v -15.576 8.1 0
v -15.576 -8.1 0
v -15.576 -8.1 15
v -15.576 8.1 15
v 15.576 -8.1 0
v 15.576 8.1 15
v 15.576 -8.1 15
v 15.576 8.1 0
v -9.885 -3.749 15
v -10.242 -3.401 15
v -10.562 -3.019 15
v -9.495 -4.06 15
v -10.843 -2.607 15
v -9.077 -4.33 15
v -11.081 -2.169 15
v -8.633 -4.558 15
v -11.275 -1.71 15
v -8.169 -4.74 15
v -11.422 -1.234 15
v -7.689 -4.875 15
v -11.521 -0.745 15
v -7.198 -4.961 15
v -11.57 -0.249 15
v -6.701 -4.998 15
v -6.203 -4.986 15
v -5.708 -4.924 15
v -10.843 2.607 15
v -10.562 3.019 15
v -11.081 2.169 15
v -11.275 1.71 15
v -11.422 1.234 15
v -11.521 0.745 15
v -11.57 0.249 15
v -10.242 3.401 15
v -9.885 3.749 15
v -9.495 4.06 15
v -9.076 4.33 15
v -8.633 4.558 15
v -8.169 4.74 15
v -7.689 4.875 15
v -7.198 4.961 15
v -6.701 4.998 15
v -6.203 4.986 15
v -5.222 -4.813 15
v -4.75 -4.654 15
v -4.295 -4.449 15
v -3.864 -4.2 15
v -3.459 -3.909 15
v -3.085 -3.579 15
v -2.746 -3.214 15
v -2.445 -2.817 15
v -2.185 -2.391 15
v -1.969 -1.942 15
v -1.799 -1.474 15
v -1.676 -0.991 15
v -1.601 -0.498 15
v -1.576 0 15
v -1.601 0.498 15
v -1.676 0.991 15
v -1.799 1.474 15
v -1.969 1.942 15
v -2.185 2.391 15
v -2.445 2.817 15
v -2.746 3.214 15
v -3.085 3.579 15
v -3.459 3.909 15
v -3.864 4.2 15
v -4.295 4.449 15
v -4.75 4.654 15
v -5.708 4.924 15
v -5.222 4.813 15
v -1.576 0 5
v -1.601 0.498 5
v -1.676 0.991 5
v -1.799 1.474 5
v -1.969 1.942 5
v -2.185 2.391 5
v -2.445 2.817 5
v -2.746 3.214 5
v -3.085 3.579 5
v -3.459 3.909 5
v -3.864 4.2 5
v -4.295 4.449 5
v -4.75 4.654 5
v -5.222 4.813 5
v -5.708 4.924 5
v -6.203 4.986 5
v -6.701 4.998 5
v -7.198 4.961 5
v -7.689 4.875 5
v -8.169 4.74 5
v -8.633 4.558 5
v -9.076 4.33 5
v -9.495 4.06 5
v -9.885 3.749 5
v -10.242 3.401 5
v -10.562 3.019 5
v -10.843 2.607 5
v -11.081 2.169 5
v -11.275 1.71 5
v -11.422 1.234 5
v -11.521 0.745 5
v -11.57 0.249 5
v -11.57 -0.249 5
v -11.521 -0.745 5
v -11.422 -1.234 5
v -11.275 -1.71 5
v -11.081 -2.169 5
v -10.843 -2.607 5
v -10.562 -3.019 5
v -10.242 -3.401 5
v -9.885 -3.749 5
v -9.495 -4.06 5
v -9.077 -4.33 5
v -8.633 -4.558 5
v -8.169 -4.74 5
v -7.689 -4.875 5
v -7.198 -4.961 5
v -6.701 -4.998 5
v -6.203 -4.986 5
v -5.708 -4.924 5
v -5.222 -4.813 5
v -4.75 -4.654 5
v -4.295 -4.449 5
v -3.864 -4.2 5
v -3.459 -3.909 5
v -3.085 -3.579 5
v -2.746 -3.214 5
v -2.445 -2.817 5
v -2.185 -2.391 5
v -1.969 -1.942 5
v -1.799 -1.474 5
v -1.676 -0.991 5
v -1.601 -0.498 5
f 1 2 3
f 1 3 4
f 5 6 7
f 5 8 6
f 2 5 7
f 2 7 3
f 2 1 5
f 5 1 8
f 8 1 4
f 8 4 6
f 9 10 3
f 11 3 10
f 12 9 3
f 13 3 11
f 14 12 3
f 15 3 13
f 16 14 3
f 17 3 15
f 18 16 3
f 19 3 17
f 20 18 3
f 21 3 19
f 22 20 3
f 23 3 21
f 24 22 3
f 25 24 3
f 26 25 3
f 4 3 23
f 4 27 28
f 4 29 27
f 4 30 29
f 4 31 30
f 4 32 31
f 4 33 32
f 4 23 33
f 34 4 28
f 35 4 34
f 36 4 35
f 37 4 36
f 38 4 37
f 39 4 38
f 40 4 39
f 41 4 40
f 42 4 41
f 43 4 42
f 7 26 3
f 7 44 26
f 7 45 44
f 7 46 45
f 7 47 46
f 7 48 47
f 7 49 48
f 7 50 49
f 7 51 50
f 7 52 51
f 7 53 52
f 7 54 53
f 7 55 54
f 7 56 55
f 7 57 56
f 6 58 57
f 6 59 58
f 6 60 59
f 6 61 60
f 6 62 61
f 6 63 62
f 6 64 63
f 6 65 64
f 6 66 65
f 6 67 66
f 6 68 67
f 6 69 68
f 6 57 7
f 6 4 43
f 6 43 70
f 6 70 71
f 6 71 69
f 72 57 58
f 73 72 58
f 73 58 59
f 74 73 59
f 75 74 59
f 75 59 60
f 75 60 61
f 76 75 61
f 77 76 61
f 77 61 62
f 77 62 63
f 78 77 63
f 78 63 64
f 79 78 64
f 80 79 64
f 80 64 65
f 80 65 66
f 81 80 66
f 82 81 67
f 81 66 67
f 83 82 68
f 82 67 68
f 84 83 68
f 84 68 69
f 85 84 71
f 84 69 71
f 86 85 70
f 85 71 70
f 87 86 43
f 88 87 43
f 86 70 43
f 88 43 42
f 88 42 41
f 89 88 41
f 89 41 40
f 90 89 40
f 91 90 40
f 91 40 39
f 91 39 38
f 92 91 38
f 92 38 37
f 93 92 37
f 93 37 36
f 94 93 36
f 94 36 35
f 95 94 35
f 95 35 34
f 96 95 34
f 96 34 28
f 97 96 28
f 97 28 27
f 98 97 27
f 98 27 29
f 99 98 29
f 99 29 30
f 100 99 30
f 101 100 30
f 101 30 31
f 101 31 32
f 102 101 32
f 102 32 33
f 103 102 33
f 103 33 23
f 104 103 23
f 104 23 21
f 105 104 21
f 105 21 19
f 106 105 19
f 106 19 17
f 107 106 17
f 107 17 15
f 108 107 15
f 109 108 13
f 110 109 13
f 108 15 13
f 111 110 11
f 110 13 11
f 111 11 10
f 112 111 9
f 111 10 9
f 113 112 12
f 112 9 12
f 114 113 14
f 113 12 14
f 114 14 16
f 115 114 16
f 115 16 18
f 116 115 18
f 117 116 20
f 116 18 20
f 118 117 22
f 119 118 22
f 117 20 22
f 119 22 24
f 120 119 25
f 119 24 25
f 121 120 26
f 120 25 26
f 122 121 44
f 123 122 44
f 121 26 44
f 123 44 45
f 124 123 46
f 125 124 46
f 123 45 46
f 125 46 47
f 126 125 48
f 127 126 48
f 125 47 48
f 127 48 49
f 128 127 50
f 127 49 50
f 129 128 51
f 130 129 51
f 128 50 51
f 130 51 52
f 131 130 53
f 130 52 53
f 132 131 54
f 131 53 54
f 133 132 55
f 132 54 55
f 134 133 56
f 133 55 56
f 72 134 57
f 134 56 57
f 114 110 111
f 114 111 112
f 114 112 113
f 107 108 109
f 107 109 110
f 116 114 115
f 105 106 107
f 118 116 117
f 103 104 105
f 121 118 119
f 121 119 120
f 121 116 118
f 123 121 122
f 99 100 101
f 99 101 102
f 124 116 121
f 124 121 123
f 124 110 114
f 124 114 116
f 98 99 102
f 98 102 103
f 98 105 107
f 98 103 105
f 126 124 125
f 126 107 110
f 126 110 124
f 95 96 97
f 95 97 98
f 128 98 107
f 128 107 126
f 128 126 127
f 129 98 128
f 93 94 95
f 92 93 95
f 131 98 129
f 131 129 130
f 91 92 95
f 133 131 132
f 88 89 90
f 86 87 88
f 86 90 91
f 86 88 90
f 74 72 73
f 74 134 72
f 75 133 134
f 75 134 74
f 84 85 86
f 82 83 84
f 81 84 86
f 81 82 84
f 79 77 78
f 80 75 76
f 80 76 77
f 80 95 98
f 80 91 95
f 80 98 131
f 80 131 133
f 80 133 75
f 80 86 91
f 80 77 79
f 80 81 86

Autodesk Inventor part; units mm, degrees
ref_plane "YZ Plane" through (0, 0, 0) normal (1, 0, 0) x (0, 1, 0)
ref_plane "XZ Plane" through (0, 0, 0) normal (0, 1, 0) x (-1, 0, 0)
ref_plane "XY Plane" through (0, 0, 0) normal (0, 0, 1) x (1, 0, 0)
sketch "Sketch1" plane through (0, 0, 0) normal (0, 0, 1) x (1, 0, 0)
  line L0 (-15.5765, 8.1) -> (15.5765, 8.1)
  line L1 (15.5765, 8.1) -> (15.5765, -8.1)
  line L2 (15.5765, -8.1) -> (-15.5765, -8.1)
  line L3 (-15.5765, -8.1) -> (-15.5765, 8.1)
  line L4 (0, 11.34) -> (0, -11.34) construction
  line L5 (-21.8071, 0) -> (21.8071, 0) construction
  point P0 (0, 0)
  dimension "d0" = 31.153
  dimension "d1" = 16.2
extrude "Extrusion1" add sketch "Sketch1" along normal blind 15
sketch "Sketch2" plane through (0, 0, 15) normal (0, 0, 1) x (1, 0, 0)
  line L0 (-15.5765, 8.1) -> (-15.5765, -8.1) projected
  circle A0 centre (-6.5765, 0) radius 5
  line L1 (-21.8071, 0) -> (21.8071, 0) construction
  point P0 (0, 0)
  dimension "d5" = 10
  dimension "d6" = 9
extrude "Extrusion2" cut sketch "Sketch2" against normal blind 10
properties part number "supporto_guide_10Z"
